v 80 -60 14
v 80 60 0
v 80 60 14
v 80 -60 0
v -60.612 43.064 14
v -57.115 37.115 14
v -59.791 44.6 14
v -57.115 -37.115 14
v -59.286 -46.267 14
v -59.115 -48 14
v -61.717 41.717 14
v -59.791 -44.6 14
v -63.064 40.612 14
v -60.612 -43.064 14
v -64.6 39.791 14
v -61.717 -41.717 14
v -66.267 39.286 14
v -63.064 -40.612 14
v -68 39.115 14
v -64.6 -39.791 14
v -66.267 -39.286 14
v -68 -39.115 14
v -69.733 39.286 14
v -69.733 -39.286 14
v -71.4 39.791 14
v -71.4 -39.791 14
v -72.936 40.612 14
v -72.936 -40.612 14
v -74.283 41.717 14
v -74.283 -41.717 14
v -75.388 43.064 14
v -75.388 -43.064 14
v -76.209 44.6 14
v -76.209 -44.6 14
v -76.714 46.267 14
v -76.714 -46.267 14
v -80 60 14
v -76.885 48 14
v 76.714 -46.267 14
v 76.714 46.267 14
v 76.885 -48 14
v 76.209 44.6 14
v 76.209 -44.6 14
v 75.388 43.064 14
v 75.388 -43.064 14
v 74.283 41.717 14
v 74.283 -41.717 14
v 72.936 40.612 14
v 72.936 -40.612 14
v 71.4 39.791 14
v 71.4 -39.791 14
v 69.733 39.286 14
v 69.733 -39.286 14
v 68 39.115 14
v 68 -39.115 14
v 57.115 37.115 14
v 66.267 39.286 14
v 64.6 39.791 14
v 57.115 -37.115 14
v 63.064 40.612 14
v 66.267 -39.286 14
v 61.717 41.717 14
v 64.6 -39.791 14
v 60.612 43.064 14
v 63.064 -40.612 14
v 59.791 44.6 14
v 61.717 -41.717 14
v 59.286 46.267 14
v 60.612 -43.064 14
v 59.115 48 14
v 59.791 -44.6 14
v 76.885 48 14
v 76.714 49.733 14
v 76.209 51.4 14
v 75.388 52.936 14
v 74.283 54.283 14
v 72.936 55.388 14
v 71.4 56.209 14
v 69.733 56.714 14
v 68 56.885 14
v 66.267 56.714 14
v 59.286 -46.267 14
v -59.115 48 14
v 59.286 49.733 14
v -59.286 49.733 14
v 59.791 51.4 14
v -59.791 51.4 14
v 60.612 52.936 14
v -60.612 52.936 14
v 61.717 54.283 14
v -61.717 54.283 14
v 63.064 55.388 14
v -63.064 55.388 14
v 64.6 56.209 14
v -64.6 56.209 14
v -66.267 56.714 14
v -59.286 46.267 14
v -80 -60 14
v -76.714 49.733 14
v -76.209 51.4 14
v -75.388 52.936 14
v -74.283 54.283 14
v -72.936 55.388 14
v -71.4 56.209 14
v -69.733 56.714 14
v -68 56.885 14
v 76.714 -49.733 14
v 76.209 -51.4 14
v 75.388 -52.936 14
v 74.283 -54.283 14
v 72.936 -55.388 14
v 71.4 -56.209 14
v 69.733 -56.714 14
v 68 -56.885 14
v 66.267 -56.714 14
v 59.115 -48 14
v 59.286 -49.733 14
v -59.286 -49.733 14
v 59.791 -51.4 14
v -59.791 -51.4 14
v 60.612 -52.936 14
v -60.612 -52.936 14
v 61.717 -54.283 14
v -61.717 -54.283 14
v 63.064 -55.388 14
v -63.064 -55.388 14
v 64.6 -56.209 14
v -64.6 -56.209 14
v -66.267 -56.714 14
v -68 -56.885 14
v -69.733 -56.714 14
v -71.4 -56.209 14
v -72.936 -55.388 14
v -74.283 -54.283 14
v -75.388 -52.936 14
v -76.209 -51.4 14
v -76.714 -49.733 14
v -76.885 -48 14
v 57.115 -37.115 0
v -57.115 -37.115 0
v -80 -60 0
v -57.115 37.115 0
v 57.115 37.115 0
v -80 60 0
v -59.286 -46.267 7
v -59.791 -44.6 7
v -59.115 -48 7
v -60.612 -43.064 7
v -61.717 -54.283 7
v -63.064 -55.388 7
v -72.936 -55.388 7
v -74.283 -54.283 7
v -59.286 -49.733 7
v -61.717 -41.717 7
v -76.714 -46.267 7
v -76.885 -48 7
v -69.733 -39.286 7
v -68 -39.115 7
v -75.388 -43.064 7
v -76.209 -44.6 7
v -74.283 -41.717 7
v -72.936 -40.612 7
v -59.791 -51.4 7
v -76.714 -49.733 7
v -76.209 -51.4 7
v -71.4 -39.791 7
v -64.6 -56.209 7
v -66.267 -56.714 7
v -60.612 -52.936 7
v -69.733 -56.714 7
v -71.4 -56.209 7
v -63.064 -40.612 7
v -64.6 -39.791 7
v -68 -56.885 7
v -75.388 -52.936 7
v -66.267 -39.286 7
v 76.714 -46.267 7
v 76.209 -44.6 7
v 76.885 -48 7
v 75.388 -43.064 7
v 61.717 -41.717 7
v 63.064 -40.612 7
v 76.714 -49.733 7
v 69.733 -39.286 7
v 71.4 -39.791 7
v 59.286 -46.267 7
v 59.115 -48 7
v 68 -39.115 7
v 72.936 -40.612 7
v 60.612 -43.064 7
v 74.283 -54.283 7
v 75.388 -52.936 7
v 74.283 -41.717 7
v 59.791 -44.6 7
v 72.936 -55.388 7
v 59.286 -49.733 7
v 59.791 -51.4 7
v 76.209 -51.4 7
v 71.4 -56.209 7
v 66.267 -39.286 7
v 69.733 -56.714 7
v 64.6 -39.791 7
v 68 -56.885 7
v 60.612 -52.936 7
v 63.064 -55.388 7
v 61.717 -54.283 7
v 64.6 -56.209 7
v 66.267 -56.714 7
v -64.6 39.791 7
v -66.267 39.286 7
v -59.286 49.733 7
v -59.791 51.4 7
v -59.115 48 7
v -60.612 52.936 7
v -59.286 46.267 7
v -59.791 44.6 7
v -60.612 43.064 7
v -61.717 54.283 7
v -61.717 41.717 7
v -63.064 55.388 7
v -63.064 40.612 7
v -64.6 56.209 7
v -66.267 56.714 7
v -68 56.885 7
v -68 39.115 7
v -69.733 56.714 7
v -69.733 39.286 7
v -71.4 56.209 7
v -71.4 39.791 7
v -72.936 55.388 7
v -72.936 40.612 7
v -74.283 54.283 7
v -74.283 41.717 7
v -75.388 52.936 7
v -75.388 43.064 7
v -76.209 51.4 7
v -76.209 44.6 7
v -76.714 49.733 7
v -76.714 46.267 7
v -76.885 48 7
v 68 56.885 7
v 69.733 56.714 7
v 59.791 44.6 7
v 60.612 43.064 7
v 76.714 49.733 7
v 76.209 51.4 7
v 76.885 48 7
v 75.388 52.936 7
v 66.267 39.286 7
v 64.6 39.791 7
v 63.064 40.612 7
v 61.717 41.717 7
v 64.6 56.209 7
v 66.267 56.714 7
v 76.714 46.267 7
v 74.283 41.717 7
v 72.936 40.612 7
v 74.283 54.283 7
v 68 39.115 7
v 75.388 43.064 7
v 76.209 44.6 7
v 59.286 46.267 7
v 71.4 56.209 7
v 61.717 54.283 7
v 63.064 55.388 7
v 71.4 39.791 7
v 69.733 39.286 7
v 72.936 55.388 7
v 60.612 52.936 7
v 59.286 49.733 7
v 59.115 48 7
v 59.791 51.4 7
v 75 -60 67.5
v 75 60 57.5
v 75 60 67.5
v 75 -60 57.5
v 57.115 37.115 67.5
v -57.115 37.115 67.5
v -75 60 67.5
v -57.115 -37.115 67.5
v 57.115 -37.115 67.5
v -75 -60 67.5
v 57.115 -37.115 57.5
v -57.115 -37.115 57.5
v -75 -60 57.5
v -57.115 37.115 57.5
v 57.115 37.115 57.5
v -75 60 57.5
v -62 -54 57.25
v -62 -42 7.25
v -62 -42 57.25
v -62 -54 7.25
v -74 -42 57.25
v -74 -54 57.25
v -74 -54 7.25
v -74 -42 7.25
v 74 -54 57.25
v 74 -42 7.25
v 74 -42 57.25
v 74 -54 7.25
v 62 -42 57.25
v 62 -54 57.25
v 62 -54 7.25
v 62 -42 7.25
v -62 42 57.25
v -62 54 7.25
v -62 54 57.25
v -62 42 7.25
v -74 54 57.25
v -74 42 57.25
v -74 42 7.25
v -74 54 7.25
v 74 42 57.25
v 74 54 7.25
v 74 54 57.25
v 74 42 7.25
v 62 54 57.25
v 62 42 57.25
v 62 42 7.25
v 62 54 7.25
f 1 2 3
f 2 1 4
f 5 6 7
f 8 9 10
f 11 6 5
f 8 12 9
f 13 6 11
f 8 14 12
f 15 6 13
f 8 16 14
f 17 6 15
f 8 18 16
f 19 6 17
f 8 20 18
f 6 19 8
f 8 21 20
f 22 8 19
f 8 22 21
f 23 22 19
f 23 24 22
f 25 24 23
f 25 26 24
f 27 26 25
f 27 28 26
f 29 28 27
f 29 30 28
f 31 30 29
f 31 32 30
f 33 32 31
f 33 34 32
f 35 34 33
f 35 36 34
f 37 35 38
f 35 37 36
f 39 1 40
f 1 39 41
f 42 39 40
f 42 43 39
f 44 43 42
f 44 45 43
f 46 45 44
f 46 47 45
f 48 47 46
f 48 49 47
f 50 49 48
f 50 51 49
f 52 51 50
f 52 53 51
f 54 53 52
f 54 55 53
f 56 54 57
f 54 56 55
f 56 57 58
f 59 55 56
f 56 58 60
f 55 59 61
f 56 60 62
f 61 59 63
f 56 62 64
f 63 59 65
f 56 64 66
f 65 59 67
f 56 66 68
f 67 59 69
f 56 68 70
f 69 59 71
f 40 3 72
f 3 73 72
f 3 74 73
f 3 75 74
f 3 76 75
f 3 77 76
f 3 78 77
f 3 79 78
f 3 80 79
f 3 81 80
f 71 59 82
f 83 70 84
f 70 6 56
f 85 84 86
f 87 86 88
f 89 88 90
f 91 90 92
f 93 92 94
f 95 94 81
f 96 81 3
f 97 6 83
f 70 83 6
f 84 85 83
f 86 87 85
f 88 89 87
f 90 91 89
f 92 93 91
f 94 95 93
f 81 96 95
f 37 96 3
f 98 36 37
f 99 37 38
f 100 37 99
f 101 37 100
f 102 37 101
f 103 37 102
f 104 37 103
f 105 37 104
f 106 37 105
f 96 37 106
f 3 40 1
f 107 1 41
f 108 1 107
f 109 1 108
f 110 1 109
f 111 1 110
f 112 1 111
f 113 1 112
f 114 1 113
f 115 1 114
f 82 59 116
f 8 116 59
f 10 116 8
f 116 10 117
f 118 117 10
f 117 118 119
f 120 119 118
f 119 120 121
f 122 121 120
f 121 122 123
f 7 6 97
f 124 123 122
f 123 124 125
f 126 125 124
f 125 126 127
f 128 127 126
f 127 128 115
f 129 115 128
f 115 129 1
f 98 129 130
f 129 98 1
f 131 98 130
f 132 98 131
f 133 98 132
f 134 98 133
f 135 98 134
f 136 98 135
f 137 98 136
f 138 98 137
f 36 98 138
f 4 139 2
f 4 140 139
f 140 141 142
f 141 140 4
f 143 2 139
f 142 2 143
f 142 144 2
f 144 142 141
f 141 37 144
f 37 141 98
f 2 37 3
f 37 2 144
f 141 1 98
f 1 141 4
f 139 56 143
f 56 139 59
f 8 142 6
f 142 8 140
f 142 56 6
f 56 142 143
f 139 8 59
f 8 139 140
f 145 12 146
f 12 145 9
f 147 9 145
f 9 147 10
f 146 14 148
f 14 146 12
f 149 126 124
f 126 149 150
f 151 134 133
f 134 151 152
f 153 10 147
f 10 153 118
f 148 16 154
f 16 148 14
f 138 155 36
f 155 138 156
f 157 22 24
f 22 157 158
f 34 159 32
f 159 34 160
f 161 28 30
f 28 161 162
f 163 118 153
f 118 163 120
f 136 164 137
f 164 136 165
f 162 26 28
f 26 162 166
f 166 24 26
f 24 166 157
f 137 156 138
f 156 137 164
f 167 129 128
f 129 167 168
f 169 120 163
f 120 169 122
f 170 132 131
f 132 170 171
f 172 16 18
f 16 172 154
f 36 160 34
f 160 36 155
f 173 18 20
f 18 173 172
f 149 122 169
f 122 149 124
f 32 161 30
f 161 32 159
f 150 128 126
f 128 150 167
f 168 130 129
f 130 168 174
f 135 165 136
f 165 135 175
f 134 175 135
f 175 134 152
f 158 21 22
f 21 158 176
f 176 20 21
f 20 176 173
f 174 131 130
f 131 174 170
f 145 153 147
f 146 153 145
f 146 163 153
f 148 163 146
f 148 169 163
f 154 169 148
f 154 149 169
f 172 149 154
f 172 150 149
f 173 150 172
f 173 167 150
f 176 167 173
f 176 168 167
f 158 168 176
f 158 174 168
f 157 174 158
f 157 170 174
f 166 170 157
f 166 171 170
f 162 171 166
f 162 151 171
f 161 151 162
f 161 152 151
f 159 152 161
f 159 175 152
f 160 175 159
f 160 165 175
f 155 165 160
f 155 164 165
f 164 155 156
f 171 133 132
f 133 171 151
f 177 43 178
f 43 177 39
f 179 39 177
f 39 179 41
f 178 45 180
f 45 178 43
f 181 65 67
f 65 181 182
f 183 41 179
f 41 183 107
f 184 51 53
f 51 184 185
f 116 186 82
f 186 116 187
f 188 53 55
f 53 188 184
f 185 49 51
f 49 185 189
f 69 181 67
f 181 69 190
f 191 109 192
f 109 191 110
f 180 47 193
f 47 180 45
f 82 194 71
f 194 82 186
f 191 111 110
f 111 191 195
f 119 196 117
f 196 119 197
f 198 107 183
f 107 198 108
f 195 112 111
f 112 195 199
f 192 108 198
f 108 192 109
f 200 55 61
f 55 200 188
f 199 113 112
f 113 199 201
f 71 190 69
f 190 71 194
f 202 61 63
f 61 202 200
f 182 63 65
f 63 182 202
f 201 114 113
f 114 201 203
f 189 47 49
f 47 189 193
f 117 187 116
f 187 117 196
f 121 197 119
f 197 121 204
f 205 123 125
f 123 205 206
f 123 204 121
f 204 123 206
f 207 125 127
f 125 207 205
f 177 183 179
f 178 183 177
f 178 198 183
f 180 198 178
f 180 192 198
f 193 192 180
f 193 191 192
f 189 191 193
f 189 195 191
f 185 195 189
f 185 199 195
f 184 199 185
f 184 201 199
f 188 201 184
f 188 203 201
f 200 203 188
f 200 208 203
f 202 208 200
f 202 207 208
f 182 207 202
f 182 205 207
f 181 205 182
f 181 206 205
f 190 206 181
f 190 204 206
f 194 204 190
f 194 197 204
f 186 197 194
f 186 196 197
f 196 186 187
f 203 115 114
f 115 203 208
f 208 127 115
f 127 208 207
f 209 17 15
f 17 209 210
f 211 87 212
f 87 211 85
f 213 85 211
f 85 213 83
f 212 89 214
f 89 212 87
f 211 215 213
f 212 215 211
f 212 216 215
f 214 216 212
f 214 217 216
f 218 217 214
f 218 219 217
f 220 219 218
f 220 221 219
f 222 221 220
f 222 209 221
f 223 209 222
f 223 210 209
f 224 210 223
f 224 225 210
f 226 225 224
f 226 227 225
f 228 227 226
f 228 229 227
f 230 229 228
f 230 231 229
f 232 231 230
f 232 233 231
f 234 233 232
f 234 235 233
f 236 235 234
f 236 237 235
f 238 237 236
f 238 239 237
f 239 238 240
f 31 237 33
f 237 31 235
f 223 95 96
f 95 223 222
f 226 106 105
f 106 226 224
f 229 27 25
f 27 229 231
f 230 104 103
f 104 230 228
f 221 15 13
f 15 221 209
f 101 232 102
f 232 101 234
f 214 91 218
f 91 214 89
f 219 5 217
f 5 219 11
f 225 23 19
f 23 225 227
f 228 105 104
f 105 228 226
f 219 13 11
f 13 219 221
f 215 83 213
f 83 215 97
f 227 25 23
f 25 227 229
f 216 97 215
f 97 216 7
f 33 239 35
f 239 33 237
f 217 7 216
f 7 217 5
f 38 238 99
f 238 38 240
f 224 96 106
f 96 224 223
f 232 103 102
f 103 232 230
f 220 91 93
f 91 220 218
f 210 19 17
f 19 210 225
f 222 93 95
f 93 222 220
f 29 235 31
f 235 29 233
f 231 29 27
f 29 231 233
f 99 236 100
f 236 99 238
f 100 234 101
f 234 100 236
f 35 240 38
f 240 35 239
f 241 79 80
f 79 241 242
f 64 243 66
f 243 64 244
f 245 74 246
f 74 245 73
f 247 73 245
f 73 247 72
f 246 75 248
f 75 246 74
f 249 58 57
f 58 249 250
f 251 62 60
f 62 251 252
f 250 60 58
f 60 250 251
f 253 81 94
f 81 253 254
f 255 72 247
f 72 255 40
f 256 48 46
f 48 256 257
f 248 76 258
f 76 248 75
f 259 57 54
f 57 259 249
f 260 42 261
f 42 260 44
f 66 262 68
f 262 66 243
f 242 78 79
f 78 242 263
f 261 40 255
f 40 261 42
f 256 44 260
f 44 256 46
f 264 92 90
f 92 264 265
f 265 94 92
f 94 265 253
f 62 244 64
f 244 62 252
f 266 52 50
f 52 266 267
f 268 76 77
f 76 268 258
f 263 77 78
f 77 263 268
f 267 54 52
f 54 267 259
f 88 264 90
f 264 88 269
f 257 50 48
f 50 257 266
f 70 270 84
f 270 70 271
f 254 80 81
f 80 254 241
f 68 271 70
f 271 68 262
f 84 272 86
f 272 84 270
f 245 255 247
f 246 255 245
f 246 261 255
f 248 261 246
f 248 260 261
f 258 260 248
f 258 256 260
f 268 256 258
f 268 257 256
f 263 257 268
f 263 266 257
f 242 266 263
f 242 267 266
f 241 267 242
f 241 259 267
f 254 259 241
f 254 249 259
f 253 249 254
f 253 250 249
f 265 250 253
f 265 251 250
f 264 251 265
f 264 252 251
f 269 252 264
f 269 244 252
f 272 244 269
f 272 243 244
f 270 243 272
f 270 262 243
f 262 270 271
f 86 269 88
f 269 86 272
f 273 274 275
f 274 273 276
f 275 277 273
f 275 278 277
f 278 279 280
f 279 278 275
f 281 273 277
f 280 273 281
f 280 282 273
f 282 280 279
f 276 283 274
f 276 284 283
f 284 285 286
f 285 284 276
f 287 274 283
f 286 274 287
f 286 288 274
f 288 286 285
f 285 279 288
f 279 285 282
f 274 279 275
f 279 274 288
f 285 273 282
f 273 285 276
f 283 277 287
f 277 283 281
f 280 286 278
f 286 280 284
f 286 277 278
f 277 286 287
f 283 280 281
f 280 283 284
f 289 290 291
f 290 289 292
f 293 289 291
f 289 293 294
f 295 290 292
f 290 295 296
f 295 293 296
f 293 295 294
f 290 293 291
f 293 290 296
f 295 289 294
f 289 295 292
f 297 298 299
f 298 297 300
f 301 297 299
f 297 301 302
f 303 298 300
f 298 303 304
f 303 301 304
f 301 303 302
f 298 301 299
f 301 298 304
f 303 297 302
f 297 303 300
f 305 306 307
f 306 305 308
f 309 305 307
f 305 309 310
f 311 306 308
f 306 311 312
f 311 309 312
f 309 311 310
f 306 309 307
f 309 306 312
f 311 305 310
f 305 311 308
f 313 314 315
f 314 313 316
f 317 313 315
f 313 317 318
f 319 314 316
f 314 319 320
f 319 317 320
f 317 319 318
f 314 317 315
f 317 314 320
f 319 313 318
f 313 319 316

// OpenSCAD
$fn = 32;

// ------------------------------------------------------------------------
// Frame cube: base 160 x 120 mm, posts 50 mm tall
// Every part is its own module, assembly() places every instance.
// ------------------------------------------------------------------------

// --- part 1 ---
module base_frame() {
  difference() {
    translate([-80, -60, 0]) cube([160, 120, 14]);
    translate([-57.115, -37.115, -1]) cube([114.23, 74.23, 16]);
    translate([-68, -48, 7]) cylinder(h = 8, d = 17.77);
    translate([68, -48, 7]) cylinder(h = 8, d = 17.77);
    translate([-68, 48, 7]) cylinder(h = 8, d = 17.77);
    translate([68, 48, 7]) cylinder(h = 8, d = 17.77);
  }
}

// --- part 2 ---
module corner_post() {
  translate([-6, -6, 0]) cube([12, 12, 50]);
}

// --- part 3 ---
module top_frame() {
  difference() {
    translate([-75, -60, 0]) cube([150, 120, 10]);
    translate([-57.115, -37.115, -1]) cube([114.23, 74.23, 12]);
  }
}

// --- assembly ---
module assembly() {
  color([0.80, 0.24, 0.20]) translate([0, 0, 0]) rotate([0, 0, 0]) base_frame();
  color([0.20, 0.45, 0.75]) translate([-68, -48, 7.25]) rotate([0, 0, 0]) corner_post();
  color([0.25, 0.62, 0.32]) translate([68, -48, 7.25]) rotate([0, 0, 0]) corner_post();
  color([0.92, 0.70, 0.18]) translate([-68, 48, 7.25]) rotate([0, 0, 0]) corner_post();
  color([0.58, 0.35, 0.70]) translate([68, 48, 7.25]) rotate([0, 0, 0]) corner_post();
  color([0.16, 0.66, 0.66]) translate([0, 0, 57.5]) rotate([0, 0, 0]) top_frame();
}

assembly();
